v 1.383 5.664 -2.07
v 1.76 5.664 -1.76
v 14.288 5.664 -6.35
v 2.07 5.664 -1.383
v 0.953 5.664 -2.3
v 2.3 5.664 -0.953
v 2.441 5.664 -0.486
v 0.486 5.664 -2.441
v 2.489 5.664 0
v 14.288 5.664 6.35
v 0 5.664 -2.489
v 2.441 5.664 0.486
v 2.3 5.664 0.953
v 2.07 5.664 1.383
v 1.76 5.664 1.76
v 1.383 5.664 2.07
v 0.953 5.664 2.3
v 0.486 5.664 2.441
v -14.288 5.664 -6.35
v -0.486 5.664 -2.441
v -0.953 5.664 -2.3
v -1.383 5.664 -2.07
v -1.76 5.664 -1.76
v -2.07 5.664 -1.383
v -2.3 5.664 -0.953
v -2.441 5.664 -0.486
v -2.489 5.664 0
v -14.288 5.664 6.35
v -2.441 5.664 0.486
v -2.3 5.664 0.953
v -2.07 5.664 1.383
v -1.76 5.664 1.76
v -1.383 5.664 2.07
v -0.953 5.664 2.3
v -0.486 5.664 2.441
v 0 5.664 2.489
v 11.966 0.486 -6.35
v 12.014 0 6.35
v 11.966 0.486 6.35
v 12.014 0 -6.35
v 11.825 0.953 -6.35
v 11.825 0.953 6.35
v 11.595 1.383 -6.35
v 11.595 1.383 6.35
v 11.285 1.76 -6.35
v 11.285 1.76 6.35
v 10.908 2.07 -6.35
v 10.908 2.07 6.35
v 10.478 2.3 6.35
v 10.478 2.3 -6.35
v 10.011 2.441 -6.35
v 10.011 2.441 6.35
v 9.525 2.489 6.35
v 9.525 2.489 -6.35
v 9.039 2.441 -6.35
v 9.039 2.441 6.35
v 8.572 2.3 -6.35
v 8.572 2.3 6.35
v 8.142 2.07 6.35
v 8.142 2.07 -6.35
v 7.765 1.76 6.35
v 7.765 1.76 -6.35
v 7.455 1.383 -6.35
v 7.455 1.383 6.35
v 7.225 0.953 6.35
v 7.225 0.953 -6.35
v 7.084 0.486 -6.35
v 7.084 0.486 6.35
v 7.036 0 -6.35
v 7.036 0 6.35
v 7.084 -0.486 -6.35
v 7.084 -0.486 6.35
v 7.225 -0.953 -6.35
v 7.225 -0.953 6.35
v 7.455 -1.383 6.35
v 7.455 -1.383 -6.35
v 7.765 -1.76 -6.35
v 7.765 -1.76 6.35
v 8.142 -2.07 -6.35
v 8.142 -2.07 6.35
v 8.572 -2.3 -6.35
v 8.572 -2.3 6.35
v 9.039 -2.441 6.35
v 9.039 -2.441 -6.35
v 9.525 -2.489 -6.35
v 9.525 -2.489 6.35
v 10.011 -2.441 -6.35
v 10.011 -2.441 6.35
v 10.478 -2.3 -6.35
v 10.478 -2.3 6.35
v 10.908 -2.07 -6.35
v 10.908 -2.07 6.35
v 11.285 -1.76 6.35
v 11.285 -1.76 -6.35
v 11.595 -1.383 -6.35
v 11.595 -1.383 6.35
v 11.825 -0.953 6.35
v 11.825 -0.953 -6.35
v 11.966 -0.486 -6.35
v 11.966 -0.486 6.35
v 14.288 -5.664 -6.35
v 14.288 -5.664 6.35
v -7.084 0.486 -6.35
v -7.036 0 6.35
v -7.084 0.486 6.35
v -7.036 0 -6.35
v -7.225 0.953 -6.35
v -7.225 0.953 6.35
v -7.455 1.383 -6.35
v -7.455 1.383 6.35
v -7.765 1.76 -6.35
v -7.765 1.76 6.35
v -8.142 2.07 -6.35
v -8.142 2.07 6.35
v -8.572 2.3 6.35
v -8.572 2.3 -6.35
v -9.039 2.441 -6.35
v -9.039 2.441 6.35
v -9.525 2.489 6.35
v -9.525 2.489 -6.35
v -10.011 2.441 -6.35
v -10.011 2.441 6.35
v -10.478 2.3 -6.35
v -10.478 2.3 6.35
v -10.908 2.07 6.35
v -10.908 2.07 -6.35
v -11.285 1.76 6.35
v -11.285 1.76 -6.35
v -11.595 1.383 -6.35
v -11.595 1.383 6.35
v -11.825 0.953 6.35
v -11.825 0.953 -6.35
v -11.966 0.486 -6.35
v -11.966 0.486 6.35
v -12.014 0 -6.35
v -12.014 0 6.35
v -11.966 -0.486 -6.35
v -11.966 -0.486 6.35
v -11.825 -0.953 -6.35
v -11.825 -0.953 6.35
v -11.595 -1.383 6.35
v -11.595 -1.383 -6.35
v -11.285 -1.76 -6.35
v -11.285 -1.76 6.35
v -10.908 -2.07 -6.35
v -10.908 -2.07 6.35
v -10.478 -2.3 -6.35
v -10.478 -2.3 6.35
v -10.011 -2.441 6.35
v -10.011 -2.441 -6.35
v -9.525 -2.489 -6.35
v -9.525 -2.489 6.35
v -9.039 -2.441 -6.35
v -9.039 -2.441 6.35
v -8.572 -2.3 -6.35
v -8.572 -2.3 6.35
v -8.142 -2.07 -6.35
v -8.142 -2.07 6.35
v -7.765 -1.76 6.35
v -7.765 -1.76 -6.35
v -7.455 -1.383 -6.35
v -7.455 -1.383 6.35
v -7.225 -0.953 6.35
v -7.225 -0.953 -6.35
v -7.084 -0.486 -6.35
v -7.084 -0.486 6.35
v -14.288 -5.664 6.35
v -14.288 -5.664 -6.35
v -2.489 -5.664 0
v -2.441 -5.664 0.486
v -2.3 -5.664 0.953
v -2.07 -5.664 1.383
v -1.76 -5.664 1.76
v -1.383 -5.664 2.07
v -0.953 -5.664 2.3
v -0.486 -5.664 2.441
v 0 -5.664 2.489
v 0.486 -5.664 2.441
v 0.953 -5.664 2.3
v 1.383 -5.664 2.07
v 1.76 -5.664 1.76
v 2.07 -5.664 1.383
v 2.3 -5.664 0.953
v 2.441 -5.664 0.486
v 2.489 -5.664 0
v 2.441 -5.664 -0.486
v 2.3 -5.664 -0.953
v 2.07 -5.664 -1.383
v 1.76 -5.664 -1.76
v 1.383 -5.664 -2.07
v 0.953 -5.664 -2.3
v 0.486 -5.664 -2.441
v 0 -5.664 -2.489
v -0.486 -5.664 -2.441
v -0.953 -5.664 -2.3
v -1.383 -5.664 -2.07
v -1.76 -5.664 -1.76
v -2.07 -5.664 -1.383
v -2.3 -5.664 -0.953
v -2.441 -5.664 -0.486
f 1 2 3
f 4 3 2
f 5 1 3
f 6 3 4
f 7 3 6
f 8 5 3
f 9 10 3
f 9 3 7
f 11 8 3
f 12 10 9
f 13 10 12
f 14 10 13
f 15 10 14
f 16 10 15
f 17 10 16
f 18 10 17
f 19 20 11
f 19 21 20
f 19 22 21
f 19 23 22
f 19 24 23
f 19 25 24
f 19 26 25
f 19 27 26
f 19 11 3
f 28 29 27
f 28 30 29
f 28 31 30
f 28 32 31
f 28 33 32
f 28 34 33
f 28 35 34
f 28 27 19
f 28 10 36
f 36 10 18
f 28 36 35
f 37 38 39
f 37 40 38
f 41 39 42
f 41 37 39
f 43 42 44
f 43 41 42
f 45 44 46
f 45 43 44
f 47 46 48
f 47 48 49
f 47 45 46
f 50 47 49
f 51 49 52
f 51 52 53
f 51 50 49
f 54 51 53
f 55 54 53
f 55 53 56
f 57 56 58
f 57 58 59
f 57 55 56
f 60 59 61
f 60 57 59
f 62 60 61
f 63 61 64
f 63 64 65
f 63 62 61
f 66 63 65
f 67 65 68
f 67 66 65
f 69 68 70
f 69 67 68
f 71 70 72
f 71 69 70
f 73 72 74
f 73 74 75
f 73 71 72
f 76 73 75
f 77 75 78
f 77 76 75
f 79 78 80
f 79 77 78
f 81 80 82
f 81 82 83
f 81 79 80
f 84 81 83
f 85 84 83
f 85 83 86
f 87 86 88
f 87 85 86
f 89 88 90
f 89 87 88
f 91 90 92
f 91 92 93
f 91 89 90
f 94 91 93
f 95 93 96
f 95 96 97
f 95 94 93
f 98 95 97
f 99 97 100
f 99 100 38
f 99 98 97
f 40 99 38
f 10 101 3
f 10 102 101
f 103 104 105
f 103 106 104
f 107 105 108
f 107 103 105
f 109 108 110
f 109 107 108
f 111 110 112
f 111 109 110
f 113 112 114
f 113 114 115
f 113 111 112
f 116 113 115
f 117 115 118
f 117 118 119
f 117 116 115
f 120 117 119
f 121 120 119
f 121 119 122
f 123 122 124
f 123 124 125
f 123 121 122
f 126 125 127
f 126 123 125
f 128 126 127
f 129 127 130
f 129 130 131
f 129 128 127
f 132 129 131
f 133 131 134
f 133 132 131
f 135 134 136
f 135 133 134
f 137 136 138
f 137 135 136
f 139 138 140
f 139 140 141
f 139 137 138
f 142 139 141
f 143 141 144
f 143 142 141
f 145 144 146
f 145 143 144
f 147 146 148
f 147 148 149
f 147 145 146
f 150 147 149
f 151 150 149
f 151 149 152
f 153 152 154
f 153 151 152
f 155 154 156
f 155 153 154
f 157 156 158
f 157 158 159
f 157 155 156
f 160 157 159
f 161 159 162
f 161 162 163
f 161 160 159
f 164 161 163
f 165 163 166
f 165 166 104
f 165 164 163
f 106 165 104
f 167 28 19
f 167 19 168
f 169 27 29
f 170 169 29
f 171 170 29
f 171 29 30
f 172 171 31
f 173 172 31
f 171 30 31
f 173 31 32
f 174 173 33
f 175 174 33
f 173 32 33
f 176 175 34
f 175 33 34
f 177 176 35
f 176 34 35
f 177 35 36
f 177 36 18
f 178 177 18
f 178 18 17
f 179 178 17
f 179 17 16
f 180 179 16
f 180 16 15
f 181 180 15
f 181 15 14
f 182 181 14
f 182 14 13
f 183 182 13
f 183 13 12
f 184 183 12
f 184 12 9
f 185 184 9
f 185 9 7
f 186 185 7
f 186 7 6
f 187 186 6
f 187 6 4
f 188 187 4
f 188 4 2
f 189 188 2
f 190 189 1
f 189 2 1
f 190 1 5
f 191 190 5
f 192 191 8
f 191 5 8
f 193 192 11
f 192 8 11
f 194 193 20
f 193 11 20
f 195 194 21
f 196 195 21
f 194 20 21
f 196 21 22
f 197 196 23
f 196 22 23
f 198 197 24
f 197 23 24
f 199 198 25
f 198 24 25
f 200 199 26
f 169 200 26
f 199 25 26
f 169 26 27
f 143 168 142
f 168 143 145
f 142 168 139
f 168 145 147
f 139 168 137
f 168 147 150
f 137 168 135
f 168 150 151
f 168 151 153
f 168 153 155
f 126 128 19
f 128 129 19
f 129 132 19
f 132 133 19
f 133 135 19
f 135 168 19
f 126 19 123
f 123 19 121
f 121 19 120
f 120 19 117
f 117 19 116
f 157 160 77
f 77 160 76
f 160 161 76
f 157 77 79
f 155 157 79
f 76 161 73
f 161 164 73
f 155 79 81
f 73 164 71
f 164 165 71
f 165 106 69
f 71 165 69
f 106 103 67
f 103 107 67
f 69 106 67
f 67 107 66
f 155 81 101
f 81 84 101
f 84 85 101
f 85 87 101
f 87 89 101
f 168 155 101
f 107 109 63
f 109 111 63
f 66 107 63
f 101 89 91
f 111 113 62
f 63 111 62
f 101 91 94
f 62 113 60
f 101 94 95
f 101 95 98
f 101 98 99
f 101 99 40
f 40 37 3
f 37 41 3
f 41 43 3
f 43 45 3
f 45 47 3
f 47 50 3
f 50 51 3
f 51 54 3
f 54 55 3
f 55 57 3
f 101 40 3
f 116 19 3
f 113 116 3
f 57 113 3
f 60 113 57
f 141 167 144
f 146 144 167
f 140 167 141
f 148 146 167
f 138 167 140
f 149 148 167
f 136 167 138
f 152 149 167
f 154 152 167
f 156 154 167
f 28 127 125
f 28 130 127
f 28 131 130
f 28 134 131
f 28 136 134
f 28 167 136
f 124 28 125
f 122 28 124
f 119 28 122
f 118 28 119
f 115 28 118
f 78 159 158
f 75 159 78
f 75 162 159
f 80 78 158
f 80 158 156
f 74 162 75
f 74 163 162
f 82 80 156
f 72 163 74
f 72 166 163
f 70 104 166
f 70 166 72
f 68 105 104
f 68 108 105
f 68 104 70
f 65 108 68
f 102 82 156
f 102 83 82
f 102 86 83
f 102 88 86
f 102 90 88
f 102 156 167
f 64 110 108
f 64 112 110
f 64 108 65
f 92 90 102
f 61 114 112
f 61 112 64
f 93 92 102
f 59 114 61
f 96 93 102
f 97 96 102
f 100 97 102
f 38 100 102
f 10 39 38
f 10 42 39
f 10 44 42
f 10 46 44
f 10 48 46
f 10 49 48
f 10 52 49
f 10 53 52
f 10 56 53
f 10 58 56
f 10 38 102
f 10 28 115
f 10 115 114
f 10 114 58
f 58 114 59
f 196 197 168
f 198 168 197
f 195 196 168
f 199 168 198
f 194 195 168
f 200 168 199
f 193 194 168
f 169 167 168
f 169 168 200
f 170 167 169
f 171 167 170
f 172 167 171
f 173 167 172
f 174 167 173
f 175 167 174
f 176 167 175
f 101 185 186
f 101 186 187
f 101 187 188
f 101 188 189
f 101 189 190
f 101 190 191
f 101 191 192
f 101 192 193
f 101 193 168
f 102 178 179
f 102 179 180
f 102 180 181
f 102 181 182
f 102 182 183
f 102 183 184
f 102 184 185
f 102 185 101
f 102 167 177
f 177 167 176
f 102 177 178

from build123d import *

# Parameters (mm, degrees)
SKETCH1_R           = 2.4892
BOSS_EXTRUDE1_DEPTH = 6.35
SKETCH3_R           = 2.4892
CUT_EXTRUDE1_DEPTH  = 20.307713557


with BuildPart() as part:
    # Sketch1 → Boss-Extrude1 (new, symmetric)
    with BuildSketch(Plane.XY):
        Polygon((-9.525, -5.6642), (9.525, -5.6642), (14.2875, -5.6642), (14.2875, 5.6642), (9.525, 5.6642), (-9.525, 5.6642), (-14.2875, 5.6642), (-14.2875, -5.6642), align=None)
        with Locations((-9.525, 0)):
            Circle(SKETCH1_R, mode=Mode.SUBTRACT)
        with Locations((9.525, 0)):
            Circle(SKETCH1_R, mode=Mode.SUBTRACT)
    extrude(amount=BOSS_EXTRUDE1_DEPTH, both=True)

    # Sketch3 → Cut-Extrude1 (cut, through all)
    with BuildSketch(Plane(origin=(0, 5.6642, 0), x_dir=(1, 0, 0), z_dir=(0, 1, 0))):
        with Locations(Location((0, 0, 0), (0, 0, 180))):
            Circle(SKETCH3_R)
    extrude(amount=-CUT_EXTRUDE1_DEPTH, mode=Mode.SUBTRACT)


solid = part.part
